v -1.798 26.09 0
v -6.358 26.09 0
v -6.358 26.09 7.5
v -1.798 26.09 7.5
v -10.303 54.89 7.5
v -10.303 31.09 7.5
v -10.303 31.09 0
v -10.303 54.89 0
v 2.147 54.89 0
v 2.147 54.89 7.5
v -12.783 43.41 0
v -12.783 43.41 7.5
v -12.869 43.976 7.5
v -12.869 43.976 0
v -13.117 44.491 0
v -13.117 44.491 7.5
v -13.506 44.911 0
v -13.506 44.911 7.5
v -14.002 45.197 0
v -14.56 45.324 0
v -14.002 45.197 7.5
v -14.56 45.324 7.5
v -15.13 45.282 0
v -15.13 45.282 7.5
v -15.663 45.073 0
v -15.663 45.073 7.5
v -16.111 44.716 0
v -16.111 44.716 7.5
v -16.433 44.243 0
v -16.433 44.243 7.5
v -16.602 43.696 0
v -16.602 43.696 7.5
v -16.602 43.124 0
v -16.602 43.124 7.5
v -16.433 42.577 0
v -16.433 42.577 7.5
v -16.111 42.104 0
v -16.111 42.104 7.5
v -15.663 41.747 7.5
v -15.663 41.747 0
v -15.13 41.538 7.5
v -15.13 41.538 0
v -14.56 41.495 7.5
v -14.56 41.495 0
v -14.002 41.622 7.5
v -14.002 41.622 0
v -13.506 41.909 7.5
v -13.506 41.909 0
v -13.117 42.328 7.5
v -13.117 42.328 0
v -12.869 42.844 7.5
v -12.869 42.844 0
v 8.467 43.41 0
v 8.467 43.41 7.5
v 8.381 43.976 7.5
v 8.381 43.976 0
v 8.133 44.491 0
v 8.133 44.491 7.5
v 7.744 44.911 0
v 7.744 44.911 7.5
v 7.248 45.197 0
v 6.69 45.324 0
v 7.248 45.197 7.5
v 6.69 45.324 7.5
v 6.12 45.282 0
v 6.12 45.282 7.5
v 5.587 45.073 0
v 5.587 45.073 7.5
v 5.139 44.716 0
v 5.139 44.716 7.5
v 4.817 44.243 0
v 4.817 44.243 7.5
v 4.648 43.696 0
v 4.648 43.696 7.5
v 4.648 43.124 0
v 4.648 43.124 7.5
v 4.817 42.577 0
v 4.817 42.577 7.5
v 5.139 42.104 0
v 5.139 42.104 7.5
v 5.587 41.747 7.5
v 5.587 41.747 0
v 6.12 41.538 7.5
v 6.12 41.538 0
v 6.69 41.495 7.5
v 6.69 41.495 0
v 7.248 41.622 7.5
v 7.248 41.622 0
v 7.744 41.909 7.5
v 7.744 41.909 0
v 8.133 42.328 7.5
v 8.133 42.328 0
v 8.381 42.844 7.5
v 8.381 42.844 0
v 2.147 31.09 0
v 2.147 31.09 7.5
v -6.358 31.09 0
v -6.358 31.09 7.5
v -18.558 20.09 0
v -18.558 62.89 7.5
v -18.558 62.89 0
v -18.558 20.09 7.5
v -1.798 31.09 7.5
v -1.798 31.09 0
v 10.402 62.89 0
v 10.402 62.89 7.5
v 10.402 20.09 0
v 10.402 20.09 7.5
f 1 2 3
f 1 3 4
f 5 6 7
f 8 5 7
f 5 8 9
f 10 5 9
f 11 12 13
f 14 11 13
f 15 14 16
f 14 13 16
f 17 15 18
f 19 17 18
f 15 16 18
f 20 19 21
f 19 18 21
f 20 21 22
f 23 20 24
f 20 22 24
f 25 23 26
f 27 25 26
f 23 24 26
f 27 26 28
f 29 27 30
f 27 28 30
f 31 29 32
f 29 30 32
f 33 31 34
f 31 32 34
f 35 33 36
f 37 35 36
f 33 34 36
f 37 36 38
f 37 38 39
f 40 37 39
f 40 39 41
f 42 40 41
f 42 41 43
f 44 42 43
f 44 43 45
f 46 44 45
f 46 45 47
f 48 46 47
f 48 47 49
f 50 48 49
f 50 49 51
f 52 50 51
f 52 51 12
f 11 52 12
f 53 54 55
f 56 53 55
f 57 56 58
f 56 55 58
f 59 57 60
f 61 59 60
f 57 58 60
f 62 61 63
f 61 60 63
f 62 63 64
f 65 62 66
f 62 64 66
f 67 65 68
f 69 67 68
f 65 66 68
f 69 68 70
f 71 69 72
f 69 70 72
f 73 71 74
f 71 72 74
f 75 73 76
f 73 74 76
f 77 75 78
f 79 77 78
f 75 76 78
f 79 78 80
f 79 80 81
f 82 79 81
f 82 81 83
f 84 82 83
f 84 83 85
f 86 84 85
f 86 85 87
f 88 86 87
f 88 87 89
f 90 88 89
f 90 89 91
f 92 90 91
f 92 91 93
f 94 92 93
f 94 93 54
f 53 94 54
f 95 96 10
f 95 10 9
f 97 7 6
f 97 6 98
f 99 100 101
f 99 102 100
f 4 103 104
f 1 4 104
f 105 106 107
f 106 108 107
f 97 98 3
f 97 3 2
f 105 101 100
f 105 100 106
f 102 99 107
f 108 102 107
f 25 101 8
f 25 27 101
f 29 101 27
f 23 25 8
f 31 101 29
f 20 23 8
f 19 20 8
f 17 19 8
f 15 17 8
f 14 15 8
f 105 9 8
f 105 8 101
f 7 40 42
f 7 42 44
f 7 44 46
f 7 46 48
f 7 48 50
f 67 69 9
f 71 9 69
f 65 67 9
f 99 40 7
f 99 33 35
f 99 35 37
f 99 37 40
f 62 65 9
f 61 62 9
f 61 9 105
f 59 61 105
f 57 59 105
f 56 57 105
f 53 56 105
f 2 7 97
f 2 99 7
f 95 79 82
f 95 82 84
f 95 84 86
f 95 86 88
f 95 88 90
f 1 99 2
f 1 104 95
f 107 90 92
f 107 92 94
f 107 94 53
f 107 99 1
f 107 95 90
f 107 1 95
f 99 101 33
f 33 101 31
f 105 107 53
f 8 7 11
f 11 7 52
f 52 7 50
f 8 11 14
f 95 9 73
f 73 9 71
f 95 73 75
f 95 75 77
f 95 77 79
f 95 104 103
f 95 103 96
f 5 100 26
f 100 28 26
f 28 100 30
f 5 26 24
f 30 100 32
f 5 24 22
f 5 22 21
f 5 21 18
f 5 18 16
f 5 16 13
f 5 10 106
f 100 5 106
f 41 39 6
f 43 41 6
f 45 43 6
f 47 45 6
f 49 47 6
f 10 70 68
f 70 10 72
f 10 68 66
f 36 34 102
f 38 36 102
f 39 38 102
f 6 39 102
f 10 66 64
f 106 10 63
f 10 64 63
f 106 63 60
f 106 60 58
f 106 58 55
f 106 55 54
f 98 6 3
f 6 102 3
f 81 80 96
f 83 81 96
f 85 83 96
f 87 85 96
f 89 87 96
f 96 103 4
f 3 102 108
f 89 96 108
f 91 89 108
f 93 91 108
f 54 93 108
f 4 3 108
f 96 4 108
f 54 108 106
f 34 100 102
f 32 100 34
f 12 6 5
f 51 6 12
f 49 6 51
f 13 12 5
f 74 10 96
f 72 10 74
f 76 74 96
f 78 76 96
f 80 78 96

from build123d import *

# Parameters (mm, degrees)
SKETCH1_W           = 28.96
SKETCH1_H           = 11
BOSS_EXTRUDE1_DEPTH = 7.5
SKETCH2_W           = 8.255
SKETCH2_H           = 7.5
BOSS_EXTRUDE2_DEPTH = 23.8
SKETCH3_W           = 28.96
SKETCH3_H           = 7.5
BOSS_EXTRUDE3_DEPTH = 8
SKETCH4_W           = 4.56
SKETCH4_H           = 7.5
CUT_EXTRUDE1_DEPTH  = 5
SKETCH5_R           = 1.92
CUT_EXTRUDE2_DEPTH  = 10


with BuildPart() as part:
    # Sketch1 → Boss-Extrude1 (new body)
    with BuildSketch(Plane.XY):
        with Locations((-4.078230088, 25.589734513)):
            Rectangle(SKETCH1_W, SKETCH1_H)
    extrude(amount=BOSS_EXTRUDE1_DEPTH)

    # Sketch2 → Boss-Extrude2 (add)
    with BuildSketch(Plane(origin=(0, 31.089734513, 0), x_dir=(1, 0, 0), z_dir=(0, 1, 0))):
        with Locations((-14.430730088, -3.75)):
            Rectangle(SKETCH2_W, SKETCH2_H)
        with Locations((6.274269912, -3.75)):
            Rectangle(SKETCH2_W, SKETCH2_H)
    extrude(amount=BOSS_EXTRUDE2_DEPTH)

    # Sketch3 → Boss-Extrude3 (add)
    with BuildSketch(Plane(origin=(0, 54.889734513, 0), x_dir=(1, 0, 0), z_dir=(0, 1, 0))):
        with Locations((-4.078230088, -3.75)):
            Rectangle(SKETCH3_W, SKETCH3_H)
    extrude(amount=BOSS_EXTRUDE3_DEPTH)

    # Sketch4 → Cut-Extrude1 (cut)
    with BuildSketch(Plane(origin=(0, 31.089734513, 0), x_dir=(1, 0, 0), z_dir=(0, 1, 0))):
        with Locations((-4.078230088, -3.75)):
            Rectangle(SKETCH4_W, SKETCH4_H)
    extrude(amount=-CUT_EXTRUDE1_DEPTH, mode=Mode.SUBTRACT)

    # Sketch5 → Cut-Extrude2 (cut)
    with BuildSketch(Plane.XY.offset(7.5)):
        with Locations((-14.703230088, 43.409734513)):
            Circle(SKETCH5_R)
        with Locations((6.546769912, 43.409734513)):
            Circle(SKETCH5_R)
    extrude(amount=-CUT_EXTRUDE2_DEPTH, mode=Mode.SUBTRACT)


solid = part.part
